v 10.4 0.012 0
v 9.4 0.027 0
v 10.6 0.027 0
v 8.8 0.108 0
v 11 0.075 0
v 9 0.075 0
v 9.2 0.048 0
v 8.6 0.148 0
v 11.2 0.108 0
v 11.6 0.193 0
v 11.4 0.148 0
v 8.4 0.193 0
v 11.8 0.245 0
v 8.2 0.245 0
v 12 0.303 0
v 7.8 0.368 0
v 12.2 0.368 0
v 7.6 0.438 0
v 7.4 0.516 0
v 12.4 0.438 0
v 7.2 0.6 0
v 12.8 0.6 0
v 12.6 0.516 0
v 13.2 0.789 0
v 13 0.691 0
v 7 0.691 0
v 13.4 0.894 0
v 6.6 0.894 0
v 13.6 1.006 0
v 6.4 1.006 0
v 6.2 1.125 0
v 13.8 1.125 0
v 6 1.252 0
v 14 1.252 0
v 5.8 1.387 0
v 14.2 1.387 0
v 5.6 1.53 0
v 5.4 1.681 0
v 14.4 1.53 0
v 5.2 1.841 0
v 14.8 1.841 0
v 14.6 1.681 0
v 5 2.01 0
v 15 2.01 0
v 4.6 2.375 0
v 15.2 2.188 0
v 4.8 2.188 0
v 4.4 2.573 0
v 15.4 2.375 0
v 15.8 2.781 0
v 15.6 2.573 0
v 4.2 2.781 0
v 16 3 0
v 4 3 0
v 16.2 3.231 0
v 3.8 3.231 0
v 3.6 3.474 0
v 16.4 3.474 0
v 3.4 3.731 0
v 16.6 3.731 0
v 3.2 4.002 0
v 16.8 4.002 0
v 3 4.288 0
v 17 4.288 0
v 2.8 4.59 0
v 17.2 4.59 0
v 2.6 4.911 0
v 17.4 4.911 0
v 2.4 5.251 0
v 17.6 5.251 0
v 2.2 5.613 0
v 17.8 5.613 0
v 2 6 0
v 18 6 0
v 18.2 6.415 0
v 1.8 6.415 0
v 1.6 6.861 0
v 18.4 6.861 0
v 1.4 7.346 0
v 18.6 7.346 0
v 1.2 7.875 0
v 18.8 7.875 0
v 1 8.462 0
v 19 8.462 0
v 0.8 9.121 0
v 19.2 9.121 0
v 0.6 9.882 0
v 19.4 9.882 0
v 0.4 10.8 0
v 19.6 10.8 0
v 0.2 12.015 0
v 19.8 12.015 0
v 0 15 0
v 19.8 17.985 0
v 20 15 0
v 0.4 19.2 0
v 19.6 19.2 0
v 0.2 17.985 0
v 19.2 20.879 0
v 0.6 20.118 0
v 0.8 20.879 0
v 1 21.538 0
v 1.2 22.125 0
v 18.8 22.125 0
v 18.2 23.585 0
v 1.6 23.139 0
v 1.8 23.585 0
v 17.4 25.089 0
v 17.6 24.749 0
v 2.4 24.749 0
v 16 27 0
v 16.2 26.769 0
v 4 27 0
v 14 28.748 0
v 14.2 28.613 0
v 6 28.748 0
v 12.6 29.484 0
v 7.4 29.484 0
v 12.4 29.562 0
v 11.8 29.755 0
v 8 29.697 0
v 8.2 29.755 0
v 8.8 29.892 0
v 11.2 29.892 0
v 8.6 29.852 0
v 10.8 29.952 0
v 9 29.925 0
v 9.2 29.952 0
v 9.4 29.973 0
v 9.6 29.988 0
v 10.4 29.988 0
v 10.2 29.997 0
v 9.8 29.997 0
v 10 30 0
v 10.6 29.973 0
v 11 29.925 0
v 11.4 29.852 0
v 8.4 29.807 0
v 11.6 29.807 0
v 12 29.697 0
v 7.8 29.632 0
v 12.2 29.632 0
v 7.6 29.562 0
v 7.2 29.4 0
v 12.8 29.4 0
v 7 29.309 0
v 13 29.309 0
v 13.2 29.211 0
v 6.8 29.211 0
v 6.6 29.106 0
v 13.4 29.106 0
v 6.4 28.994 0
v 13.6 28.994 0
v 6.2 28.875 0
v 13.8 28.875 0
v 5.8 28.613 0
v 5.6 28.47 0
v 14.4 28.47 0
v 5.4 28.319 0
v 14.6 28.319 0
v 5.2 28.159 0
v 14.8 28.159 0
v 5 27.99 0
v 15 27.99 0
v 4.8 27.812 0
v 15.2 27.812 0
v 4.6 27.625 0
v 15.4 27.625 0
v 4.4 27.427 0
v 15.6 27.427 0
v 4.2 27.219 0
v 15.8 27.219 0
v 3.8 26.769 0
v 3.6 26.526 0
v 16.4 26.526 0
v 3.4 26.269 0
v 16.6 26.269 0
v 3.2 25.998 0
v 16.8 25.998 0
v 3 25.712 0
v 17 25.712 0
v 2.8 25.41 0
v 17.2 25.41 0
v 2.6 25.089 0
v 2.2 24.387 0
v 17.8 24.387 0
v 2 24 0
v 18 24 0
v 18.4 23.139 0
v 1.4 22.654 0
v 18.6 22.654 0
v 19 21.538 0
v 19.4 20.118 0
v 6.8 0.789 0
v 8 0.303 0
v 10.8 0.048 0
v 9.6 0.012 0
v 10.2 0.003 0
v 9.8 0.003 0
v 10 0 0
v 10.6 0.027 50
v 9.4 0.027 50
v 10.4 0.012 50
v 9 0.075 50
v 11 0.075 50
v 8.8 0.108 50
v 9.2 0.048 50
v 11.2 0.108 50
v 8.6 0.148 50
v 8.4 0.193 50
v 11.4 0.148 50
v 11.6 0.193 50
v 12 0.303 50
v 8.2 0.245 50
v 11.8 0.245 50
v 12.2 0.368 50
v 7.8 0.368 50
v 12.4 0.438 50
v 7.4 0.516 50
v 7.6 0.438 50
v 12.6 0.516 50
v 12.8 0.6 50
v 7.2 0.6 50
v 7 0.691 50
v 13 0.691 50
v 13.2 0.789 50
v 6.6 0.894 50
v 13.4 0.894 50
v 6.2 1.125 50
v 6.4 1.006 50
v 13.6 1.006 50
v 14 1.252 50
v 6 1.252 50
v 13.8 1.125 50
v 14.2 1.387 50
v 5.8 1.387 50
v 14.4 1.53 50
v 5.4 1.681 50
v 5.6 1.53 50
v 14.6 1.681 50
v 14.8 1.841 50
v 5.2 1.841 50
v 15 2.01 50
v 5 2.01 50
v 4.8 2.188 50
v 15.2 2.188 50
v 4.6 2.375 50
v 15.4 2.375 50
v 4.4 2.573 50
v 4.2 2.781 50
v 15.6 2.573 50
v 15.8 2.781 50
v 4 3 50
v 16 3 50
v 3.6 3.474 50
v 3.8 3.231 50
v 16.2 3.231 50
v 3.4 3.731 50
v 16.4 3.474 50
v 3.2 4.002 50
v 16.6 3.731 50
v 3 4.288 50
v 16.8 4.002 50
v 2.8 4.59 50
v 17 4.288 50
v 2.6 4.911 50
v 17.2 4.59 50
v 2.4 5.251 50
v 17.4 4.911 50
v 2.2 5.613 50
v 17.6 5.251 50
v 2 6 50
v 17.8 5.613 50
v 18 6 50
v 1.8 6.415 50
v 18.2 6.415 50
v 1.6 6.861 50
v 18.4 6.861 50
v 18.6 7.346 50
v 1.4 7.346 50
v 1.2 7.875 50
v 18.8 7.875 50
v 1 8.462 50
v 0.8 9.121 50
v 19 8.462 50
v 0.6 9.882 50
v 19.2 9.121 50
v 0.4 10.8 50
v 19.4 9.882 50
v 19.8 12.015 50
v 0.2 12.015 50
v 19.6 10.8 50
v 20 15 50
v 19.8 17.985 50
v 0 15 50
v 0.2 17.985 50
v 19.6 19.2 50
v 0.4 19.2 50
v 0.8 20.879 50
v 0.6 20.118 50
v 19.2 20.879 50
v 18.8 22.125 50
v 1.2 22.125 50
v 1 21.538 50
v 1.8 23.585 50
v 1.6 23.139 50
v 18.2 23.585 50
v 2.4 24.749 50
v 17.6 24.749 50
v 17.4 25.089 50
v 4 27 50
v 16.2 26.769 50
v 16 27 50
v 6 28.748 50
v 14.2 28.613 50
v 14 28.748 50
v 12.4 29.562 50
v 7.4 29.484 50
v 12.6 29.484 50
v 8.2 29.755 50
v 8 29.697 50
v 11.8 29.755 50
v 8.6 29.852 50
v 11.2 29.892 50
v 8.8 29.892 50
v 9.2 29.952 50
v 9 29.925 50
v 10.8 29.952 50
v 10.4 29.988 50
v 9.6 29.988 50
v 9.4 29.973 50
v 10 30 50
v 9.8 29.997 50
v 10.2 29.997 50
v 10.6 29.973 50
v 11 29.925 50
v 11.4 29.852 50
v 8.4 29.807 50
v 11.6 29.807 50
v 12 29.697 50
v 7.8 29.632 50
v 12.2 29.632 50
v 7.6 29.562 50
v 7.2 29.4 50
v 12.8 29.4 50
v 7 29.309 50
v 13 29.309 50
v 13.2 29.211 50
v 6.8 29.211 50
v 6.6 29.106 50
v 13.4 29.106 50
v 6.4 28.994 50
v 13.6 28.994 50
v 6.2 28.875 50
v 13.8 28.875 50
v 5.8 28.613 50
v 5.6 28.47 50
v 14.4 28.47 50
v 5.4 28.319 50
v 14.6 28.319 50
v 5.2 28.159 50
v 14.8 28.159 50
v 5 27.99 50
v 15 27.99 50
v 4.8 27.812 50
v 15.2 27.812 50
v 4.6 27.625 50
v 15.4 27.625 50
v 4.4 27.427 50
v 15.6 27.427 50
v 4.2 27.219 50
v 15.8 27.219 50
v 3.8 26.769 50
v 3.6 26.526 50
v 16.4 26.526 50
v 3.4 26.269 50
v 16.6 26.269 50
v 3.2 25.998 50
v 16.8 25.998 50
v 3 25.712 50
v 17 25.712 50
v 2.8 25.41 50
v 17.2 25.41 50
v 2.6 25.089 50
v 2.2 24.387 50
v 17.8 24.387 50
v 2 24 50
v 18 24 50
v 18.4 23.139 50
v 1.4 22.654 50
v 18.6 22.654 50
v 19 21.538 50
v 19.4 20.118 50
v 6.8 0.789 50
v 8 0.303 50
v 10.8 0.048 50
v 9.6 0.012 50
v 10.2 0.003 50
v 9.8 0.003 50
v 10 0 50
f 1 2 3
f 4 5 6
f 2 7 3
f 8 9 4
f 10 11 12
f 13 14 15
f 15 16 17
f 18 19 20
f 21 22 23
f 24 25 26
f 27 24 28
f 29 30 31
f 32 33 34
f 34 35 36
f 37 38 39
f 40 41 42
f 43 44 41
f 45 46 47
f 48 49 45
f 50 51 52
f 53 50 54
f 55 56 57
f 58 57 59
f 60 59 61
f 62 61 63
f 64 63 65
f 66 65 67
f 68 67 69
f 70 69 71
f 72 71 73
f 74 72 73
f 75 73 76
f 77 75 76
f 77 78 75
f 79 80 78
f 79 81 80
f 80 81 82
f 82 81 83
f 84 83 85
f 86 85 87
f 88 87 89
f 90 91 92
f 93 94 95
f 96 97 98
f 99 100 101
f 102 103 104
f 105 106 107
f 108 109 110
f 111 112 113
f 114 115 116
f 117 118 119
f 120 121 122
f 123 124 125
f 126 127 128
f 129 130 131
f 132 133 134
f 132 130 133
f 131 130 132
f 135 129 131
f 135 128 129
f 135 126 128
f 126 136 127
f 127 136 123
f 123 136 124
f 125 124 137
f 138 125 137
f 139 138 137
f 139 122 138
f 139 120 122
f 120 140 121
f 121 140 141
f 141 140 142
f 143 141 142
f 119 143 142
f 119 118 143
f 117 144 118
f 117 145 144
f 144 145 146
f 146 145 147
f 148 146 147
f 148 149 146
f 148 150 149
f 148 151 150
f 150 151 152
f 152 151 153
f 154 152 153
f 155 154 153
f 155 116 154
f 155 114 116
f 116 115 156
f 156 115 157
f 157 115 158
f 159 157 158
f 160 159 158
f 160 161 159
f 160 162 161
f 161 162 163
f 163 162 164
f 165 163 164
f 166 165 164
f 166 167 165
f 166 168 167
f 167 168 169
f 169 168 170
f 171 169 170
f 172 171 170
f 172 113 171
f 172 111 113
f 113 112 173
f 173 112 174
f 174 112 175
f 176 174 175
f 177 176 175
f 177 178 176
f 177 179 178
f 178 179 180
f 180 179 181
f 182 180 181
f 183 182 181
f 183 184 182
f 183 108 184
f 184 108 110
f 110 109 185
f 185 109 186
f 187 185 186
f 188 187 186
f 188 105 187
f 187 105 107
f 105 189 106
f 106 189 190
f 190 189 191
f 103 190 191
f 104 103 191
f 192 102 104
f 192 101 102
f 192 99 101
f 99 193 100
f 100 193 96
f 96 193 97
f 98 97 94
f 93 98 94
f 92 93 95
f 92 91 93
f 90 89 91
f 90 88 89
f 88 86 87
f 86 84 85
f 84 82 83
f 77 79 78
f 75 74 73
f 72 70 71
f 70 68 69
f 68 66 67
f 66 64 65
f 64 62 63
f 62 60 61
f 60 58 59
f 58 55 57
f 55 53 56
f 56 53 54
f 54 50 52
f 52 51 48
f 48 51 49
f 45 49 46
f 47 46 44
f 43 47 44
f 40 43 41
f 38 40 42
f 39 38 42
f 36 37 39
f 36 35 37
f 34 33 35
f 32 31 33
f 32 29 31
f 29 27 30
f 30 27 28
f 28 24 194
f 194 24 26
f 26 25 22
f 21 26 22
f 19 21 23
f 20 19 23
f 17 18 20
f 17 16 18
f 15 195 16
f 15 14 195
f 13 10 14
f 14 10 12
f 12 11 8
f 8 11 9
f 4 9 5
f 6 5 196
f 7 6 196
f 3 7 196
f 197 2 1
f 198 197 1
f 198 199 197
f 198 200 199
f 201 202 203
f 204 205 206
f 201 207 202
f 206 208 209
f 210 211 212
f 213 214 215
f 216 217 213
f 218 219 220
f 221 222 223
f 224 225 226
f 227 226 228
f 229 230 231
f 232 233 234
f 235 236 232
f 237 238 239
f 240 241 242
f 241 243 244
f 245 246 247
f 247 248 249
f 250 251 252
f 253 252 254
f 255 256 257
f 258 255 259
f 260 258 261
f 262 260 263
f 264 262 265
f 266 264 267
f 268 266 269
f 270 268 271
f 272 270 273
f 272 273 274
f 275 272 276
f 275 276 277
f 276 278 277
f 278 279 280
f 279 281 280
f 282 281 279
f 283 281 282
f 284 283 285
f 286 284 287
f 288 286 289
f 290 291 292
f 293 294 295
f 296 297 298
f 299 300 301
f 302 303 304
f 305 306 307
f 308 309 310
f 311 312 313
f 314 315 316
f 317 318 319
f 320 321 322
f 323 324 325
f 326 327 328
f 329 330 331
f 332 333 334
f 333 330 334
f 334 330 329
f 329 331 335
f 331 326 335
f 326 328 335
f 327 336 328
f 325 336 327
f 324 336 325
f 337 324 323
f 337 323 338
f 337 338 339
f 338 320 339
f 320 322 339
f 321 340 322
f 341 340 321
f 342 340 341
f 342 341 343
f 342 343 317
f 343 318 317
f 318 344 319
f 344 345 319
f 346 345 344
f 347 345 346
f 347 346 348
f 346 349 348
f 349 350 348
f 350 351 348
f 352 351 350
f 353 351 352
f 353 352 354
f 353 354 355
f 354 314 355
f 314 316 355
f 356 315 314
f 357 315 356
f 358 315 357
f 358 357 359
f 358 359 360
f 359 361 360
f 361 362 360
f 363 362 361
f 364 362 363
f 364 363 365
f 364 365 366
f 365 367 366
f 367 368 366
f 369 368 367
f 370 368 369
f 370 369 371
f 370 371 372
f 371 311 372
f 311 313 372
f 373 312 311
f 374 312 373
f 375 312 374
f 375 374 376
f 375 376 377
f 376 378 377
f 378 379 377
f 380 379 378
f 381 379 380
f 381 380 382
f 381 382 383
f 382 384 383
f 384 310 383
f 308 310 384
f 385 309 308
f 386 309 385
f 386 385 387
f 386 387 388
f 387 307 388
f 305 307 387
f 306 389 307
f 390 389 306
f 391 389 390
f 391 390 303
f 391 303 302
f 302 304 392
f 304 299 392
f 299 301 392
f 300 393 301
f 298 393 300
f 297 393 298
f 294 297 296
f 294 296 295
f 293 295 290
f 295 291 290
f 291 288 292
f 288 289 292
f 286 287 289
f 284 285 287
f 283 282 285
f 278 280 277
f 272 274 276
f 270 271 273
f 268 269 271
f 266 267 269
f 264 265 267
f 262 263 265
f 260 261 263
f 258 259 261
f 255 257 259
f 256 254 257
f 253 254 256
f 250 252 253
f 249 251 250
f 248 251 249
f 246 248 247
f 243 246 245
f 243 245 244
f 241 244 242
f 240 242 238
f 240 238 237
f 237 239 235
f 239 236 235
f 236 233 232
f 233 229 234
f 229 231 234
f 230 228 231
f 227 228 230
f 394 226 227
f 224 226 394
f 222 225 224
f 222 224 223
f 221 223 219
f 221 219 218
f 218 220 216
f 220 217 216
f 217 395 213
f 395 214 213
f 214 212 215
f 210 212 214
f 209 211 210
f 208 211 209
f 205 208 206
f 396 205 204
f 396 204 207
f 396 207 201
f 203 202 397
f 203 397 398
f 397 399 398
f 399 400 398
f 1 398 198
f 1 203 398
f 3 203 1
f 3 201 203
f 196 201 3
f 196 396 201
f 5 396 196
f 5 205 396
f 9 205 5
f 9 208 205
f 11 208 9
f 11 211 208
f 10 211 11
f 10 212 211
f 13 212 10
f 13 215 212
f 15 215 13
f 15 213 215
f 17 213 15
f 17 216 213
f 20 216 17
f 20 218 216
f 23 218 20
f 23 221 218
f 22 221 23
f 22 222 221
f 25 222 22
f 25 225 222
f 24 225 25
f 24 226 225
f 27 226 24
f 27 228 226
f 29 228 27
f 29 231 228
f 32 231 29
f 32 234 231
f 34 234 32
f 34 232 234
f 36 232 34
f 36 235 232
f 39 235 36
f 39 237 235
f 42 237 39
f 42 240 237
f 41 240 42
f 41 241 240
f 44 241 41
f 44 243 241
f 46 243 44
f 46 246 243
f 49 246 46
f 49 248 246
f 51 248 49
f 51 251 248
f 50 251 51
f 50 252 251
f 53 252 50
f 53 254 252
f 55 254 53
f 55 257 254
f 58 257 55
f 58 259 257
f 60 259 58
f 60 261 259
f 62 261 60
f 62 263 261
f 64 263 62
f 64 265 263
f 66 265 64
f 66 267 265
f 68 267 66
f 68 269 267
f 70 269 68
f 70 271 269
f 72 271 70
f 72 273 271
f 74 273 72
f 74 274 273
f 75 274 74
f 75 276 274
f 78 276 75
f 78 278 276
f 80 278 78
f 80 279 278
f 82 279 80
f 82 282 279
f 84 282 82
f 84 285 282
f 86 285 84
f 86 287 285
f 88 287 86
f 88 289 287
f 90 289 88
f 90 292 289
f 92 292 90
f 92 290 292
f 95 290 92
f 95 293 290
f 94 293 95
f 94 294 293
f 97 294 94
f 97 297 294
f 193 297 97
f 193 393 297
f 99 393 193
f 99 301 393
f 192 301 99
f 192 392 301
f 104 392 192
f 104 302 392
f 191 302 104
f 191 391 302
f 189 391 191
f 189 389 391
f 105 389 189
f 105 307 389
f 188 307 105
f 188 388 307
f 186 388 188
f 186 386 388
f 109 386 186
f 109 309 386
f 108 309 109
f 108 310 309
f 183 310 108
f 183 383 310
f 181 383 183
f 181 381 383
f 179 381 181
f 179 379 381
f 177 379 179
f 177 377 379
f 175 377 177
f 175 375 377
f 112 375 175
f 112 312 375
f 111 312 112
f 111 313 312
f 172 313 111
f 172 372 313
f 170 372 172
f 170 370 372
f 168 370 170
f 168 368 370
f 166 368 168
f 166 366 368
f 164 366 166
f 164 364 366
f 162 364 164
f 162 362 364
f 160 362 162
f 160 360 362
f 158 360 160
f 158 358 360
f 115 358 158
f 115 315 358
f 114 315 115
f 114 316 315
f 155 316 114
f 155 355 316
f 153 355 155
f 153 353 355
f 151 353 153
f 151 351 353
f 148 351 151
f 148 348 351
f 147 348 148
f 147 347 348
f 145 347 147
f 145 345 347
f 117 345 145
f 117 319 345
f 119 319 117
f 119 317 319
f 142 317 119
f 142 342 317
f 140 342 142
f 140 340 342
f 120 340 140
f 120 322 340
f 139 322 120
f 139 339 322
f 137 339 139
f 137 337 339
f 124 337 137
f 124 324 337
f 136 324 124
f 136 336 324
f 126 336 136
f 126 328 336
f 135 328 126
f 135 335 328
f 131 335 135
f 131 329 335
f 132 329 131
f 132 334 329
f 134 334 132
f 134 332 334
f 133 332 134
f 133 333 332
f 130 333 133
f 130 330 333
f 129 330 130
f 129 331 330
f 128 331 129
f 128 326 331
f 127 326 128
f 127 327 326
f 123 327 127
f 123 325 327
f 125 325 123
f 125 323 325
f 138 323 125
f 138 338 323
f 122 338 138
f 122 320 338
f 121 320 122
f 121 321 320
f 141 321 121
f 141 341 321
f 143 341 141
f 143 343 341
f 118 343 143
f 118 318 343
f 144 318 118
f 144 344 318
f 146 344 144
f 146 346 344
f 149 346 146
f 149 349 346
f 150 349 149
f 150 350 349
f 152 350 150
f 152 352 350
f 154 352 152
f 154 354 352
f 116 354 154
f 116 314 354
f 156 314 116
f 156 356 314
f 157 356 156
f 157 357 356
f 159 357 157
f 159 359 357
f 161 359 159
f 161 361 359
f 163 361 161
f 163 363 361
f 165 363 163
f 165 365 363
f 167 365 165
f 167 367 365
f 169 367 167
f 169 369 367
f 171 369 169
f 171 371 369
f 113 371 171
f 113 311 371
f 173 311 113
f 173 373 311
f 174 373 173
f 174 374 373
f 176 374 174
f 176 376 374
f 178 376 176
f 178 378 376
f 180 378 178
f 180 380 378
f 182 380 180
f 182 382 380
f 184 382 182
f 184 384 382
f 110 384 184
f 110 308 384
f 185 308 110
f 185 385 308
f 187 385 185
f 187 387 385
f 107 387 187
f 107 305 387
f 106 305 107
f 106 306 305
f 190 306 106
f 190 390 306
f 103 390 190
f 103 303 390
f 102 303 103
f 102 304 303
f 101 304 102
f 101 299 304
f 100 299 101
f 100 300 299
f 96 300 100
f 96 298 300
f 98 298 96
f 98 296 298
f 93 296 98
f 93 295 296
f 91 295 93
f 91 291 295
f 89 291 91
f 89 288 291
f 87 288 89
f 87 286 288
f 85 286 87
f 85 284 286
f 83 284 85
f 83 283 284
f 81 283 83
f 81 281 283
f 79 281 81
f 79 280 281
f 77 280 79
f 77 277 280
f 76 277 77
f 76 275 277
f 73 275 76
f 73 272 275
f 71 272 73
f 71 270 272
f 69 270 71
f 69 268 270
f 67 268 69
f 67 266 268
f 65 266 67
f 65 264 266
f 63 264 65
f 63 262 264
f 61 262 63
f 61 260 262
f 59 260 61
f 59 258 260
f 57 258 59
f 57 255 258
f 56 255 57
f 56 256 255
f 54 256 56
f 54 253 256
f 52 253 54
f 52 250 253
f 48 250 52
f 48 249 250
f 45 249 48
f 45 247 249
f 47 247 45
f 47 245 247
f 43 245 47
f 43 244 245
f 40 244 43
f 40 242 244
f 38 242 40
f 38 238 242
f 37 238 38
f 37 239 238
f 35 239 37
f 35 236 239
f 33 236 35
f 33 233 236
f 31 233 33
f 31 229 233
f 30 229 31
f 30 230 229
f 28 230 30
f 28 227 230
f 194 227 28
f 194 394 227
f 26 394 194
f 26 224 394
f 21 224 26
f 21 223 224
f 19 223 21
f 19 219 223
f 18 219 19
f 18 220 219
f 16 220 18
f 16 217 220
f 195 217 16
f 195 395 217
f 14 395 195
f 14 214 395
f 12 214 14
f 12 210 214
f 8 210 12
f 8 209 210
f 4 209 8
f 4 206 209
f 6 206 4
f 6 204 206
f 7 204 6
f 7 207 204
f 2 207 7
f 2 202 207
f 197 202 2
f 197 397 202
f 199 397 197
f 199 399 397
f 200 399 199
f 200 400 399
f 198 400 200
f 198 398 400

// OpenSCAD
$fn = 200;
squircleCube(20, 30, 2, 50);
*roundedCube(20, 30, 6, 50);

module squircleCube(x, y, n, h)
{
	points = [ for (i = [0 : $fn])
		let(
			t = i / $fn, //t from 0 to 1
			xVal = xFromT(t, x),
			isUp = t < 0.25 || t >= 0.75 ? true : false,
			yVal = squircle(xVal, x, y, isUp))
			//echo(t, xVal, yVal)
			[xVal, yVal] ];
	
	translate([x / 2, y / 2, 0])
	linear_extrude(height = h)
	polygon(points);
	
	function squircle(x, xSize, ySize, isUp) = 
	isUp ? squirclePart(x, xSize, ySize) : -squirclePart(x, xSize, ySize);

	function squirclePart(x, xSize, ySize) =
	(ySize / 2) * pow(1 - pow(abs(x) / (xSize / 2), n), 1 / n);
	
	function xFromT(t, xSize) =
	t < 0.25 ? xSize * 2 * t :
	(t >= 0.25 && t < 0.5 ? xSize * 2 * (0.5 - t) :
	(t >= 0.5 && t < 0.75 ? -xSize * 2 * (t - 0.5) :
	-xSize * 2 * (1 - t)));
}

module roundedCube(x, y, r, h)
{
	linear_extrude(height = h)
	render()
	difference()
	{
		square([x, y]);
		difference()
		{			
			square([x, y]);
			
			translate([0, r])
			square([x, y - 2 * r]);
			
			translate([r, 0])
			square([x - 2 * r, y]);
			
			translate([r, r])
			circle(r = r);
			
			translate([r, y - r])
			circle(r = r);
					
			translate([x - r, r])
			circle(r = r);
			
			translate([x - r, y - r])
			circle(r = r);
		}
	}
}
